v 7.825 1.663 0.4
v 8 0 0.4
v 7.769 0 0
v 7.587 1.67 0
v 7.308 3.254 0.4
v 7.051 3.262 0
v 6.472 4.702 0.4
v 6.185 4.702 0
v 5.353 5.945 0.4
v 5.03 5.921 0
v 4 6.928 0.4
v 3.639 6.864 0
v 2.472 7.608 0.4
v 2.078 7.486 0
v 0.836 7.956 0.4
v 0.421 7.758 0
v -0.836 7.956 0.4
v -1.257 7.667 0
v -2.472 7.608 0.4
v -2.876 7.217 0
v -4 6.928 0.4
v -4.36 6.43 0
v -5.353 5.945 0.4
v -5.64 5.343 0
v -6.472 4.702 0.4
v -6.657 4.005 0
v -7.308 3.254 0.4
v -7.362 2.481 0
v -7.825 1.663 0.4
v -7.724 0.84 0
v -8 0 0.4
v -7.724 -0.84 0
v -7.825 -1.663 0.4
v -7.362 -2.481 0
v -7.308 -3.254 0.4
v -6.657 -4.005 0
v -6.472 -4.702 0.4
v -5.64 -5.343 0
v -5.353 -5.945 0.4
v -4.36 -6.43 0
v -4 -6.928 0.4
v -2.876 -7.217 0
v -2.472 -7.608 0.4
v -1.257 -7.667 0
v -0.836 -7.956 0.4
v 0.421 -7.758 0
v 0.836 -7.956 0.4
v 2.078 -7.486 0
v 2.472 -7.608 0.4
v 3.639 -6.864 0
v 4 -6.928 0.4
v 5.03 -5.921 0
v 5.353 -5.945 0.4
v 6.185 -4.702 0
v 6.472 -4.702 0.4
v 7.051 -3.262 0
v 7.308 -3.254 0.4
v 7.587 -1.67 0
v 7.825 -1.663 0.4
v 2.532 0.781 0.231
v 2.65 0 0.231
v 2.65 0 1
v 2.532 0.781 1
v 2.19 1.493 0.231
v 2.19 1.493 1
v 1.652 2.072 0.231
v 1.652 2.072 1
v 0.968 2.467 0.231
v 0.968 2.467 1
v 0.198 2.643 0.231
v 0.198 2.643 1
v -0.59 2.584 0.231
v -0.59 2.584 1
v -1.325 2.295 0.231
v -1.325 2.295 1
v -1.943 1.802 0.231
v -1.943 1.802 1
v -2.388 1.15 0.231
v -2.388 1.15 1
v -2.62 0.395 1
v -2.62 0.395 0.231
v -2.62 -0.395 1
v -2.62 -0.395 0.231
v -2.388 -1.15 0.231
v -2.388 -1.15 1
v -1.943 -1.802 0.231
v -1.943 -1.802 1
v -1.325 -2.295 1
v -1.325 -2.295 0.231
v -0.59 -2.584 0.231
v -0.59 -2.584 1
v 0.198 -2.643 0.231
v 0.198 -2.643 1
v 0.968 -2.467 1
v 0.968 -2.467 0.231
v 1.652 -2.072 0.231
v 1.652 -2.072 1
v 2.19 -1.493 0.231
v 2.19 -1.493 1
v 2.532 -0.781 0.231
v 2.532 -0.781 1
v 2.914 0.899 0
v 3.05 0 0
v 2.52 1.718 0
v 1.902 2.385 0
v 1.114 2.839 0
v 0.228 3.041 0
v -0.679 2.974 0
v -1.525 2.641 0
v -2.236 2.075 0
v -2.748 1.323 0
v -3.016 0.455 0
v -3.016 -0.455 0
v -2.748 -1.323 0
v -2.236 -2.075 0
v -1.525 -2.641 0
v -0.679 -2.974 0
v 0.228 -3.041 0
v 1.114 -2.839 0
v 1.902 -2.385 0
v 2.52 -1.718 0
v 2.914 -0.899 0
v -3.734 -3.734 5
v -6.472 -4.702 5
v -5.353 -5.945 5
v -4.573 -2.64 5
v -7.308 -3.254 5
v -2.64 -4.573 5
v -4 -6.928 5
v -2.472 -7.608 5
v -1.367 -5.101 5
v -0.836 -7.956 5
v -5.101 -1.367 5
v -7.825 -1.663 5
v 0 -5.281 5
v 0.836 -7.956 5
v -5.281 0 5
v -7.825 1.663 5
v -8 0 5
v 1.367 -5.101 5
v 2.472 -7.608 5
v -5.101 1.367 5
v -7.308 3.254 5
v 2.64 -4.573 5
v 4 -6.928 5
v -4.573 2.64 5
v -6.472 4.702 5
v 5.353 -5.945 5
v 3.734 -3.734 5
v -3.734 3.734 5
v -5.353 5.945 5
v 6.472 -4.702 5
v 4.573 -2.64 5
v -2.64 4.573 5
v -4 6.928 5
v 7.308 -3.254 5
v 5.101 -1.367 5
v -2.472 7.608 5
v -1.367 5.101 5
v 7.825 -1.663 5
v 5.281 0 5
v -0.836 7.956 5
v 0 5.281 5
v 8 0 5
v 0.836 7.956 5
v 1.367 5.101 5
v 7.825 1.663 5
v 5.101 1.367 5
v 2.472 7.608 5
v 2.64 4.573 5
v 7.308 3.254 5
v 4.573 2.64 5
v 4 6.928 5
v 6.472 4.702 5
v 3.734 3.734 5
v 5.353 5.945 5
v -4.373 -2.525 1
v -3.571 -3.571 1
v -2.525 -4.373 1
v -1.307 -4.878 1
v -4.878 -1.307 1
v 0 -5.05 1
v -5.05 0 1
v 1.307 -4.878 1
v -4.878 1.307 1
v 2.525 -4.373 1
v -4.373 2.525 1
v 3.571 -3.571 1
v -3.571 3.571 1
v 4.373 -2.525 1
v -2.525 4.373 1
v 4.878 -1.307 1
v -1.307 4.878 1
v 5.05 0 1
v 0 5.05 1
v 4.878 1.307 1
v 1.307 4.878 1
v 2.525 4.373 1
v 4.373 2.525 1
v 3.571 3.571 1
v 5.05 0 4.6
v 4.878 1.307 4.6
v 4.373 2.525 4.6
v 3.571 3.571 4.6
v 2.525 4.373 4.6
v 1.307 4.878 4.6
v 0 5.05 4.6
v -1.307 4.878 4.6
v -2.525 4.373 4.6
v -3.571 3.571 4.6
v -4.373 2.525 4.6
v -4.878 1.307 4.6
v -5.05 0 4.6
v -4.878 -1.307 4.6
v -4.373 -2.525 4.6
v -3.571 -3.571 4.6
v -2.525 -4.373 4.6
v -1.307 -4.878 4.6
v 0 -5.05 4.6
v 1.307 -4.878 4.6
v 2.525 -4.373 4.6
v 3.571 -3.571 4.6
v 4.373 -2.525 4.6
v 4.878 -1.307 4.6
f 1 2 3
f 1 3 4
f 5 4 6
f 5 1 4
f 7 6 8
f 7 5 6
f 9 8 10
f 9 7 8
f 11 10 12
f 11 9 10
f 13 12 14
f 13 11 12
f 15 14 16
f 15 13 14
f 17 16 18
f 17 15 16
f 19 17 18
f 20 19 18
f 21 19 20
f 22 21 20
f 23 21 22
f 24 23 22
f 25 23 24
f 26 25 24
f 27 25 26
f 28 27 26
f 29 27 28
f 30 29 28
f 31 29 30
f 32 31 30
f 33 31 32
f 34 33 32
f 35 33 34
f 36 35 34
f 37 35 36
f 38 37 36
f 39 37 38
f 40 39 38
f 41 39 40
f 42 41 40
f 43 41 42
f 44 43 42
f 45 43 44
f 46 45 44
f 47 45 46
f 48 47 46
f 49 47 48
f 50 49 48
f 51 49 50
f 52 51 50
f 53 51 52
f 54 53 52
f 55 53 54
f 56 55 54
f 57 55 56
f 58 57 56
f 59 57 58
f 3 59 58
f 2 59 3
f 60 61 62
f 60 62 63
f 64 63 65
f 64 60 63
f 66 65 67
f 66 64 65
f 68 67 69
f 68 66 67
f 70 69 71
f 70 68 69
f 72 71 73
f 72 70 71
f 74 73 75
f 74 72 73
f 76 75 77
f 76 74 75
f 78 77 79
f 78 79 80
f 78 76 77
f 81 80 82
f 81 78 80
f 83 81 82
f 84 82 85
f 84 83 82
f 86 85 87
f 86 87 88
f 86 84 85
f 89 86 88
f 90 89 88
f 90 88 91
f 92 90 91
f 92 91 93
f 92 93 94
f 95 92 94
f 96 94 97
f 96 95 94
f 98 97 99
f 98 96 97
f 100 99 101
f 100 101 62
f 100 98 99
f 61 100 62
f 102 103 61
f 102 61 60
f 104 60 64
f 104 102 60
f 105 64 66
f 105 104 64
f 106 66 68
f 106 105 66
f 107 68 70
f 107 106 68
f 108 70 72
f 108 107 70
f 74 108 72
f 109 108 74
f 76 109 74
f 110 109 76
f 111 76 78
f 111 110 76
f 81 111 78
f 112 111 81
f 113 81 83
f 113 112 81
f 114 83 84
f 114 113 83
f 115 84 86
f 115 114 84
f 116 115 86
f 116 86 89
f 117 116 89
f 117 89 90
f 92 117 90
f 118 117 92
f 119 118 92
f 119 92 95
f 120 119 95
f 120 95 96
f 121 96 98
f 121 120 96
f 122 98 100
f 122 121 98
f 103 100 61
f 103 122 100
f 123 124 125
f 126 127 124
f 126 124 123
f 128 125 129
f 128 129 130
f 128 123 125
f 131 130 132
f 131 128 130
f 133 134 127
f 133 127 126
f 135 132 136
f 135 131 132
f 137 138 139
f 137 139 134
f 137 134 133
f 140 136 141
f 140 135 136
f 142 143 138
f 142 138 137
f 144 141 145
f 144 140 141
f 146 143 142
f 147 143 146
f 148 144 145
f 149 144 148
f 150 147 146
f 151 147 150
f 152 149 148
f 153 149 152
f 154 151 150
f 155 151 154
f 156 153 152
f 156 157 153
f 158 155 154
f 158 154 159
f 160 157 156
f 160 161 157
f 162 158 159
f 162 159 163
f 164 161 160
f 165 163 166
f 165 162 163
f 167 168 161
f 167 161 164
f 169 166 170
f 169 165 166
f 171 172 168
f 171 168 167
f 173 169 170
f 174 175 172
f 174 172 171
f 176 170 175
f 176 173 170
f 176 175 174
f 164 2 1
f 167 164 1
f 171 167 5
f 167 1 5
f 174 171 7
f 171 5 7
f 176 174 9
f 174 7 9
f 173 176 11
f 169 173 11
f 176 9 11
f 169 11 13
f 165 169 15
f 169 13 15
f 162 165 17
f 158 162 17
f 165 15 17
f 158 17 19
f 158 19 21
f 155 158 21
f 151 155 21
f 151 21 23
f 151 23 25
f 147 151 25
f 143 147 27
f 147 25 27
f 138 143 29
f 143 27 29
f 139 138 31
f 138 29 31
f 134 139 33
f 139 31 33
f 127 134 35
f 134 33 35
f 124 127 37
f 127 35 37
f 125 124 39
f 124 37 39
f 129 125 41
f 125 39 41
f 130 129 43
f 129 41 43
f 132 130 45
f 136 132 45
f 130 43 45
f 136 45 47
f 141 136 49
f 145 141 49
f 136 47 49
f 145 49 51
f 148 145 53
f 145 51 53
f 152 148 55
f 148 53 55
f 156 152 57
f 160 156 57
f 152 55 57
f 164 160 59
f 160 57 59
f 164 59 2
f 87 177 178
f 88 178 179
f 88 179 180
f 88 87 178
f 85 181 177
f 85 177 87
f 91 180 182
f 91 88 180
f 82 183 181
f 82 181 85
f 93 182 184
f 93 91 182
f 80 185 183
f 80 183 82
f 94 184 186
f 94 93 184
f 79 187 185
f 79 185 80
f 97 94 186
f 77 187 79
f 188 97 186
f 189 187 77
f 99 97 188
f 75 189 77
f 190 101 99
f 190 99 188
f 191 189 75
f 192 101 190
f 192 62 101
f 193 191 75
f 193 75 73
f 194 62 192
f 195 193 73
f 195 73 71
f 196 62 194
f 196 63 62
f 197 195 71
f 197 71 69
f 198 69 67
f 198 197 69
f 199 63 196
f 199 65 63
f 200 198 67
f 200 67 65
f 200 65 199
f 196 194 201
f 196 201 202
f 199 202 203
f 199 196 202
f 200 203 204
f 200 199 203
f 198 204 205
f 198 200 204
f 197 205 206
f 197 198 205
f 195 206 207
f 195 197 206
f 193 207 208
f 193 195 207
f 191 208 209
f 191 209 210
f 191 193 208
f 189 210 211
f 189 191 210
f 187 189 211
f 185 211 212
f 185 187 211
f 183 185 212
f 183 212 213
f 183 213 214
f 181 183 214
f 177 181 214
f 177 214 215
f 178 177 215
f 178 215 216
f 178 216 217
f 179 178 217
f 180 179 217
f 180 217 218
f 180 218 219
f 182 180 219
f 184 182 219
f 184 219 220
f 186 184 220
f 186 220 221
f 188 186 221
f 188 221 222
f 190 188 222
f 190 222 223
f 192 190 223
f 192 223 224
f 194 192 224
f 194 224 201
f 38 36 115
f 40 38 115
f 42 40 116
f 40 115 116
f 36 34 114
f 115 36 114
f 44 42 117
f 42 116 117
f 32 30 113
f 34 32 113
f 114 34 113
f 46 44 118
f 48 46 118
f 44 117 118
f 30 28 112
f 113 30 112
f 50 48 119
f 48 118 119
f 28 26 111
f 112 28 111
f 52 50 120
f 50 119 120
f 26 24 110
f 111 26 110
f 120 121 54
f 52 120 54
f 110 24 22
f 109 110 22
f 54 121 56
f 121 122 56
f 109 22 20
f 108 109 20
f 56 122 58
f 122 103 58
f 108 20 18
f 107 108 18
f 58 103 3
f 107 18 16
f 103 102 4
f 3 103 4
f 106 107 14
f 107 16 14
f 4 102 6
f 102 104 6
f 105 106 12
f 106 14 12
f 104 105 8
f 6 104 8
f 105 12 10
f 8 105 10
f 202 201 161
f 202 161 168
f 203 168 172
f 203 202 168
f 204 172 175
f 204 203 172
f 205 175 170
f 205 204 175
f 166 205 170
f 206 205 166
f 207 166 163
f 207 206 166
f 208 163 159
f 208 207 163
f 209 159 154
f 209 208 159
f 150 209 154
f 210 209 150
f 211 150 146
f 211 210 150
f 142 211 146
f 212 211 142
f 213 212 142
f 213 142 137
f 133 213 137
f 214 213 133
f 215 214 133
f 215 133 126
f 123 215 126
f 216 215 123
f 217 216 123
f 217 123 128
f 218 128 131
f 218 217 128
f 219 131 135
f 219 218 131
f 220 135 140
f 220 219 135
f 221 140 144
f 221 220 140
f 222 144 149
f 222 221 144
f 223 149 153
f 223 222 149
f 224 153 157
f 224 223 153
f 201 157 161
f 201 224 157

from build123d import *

# Parameters (mm, degrees)
F0_R        = 5.05
F0_R_2      = 2.65
F1_DEPTH    = 1
F0_R_3      = 8
F2_DEPTH    = 5
F3_C1_SIZE2 = 0.4
F3_C1_SIZE  = 0.2309401077
F3_C2_SIZE2 = 0.4
F3_C2_SIZE  = 0.2309401077
F3_C3_SIZE2 = 0.4
F3_C3_SIZE  = 0.2309401077


with BuildPart() as f1:
    # F0 (on Top) → F1 (new body)
    with BuildSketch(Plane.XY):
        Circle(F0_R)
        Circle(F0_R_2, mode=Mode.SUBTRACT)
    extrude(amount=F1_DEPTH)

    # F0 (on Top) → F2 (join)
    with BuildSketch(Plane.XY):
        Circle(F0_R_3)
        Circle(F0_R, mode=Mode.SUBTRACT)
    extrude(amount=F2_DEPTH)

    # F3: chamfer of 0.4 x 0.2309401077 on 3 edges, made by hand

    # F3_c1
    f3_c1_edges = [f1.edges().sort_by_distance(p)[0] for p in [
        (-2.65, 0, 0),
    ]]
    f3_c1_side = f1.faces().sort_by_distance((-2.65, 0, 0.0046188022))[0]
    chamfer(f3_c1_edges, length=F3_C1_SIZE, length2=F3_C1_SIZE2, reference=f3_c1_side)

    # F3_c2
    f3_c2_edges = [f1.edges().sort_by_distance(p)[0] for p in [
        (-8, 0, 0),
    ]]
    f3_c2_side = f1.faces().sort_by_distance((-7.9953811978, 0, 0))[0]
    chamfer(f3_c2_edges, length=F3_C2_SIZE, length2=F3_C2_SIZE2, reference=f3_c2_side)

    # F3_c3
    f3_c3_edges = [f1.edges().sort_by_distance(p)[0] for p in [
        (-5.05, 0, 5),
    ]]
    f3_c3_side = f1.faces().sort_by_distance((-5.0546188022, 0, 5))[0]
    chamfer(f3_c3_edges, length=F3_C3_SIZE, length2=F3_C3_SIZE2, reference=f3_c3_side)


solid = f1.part
